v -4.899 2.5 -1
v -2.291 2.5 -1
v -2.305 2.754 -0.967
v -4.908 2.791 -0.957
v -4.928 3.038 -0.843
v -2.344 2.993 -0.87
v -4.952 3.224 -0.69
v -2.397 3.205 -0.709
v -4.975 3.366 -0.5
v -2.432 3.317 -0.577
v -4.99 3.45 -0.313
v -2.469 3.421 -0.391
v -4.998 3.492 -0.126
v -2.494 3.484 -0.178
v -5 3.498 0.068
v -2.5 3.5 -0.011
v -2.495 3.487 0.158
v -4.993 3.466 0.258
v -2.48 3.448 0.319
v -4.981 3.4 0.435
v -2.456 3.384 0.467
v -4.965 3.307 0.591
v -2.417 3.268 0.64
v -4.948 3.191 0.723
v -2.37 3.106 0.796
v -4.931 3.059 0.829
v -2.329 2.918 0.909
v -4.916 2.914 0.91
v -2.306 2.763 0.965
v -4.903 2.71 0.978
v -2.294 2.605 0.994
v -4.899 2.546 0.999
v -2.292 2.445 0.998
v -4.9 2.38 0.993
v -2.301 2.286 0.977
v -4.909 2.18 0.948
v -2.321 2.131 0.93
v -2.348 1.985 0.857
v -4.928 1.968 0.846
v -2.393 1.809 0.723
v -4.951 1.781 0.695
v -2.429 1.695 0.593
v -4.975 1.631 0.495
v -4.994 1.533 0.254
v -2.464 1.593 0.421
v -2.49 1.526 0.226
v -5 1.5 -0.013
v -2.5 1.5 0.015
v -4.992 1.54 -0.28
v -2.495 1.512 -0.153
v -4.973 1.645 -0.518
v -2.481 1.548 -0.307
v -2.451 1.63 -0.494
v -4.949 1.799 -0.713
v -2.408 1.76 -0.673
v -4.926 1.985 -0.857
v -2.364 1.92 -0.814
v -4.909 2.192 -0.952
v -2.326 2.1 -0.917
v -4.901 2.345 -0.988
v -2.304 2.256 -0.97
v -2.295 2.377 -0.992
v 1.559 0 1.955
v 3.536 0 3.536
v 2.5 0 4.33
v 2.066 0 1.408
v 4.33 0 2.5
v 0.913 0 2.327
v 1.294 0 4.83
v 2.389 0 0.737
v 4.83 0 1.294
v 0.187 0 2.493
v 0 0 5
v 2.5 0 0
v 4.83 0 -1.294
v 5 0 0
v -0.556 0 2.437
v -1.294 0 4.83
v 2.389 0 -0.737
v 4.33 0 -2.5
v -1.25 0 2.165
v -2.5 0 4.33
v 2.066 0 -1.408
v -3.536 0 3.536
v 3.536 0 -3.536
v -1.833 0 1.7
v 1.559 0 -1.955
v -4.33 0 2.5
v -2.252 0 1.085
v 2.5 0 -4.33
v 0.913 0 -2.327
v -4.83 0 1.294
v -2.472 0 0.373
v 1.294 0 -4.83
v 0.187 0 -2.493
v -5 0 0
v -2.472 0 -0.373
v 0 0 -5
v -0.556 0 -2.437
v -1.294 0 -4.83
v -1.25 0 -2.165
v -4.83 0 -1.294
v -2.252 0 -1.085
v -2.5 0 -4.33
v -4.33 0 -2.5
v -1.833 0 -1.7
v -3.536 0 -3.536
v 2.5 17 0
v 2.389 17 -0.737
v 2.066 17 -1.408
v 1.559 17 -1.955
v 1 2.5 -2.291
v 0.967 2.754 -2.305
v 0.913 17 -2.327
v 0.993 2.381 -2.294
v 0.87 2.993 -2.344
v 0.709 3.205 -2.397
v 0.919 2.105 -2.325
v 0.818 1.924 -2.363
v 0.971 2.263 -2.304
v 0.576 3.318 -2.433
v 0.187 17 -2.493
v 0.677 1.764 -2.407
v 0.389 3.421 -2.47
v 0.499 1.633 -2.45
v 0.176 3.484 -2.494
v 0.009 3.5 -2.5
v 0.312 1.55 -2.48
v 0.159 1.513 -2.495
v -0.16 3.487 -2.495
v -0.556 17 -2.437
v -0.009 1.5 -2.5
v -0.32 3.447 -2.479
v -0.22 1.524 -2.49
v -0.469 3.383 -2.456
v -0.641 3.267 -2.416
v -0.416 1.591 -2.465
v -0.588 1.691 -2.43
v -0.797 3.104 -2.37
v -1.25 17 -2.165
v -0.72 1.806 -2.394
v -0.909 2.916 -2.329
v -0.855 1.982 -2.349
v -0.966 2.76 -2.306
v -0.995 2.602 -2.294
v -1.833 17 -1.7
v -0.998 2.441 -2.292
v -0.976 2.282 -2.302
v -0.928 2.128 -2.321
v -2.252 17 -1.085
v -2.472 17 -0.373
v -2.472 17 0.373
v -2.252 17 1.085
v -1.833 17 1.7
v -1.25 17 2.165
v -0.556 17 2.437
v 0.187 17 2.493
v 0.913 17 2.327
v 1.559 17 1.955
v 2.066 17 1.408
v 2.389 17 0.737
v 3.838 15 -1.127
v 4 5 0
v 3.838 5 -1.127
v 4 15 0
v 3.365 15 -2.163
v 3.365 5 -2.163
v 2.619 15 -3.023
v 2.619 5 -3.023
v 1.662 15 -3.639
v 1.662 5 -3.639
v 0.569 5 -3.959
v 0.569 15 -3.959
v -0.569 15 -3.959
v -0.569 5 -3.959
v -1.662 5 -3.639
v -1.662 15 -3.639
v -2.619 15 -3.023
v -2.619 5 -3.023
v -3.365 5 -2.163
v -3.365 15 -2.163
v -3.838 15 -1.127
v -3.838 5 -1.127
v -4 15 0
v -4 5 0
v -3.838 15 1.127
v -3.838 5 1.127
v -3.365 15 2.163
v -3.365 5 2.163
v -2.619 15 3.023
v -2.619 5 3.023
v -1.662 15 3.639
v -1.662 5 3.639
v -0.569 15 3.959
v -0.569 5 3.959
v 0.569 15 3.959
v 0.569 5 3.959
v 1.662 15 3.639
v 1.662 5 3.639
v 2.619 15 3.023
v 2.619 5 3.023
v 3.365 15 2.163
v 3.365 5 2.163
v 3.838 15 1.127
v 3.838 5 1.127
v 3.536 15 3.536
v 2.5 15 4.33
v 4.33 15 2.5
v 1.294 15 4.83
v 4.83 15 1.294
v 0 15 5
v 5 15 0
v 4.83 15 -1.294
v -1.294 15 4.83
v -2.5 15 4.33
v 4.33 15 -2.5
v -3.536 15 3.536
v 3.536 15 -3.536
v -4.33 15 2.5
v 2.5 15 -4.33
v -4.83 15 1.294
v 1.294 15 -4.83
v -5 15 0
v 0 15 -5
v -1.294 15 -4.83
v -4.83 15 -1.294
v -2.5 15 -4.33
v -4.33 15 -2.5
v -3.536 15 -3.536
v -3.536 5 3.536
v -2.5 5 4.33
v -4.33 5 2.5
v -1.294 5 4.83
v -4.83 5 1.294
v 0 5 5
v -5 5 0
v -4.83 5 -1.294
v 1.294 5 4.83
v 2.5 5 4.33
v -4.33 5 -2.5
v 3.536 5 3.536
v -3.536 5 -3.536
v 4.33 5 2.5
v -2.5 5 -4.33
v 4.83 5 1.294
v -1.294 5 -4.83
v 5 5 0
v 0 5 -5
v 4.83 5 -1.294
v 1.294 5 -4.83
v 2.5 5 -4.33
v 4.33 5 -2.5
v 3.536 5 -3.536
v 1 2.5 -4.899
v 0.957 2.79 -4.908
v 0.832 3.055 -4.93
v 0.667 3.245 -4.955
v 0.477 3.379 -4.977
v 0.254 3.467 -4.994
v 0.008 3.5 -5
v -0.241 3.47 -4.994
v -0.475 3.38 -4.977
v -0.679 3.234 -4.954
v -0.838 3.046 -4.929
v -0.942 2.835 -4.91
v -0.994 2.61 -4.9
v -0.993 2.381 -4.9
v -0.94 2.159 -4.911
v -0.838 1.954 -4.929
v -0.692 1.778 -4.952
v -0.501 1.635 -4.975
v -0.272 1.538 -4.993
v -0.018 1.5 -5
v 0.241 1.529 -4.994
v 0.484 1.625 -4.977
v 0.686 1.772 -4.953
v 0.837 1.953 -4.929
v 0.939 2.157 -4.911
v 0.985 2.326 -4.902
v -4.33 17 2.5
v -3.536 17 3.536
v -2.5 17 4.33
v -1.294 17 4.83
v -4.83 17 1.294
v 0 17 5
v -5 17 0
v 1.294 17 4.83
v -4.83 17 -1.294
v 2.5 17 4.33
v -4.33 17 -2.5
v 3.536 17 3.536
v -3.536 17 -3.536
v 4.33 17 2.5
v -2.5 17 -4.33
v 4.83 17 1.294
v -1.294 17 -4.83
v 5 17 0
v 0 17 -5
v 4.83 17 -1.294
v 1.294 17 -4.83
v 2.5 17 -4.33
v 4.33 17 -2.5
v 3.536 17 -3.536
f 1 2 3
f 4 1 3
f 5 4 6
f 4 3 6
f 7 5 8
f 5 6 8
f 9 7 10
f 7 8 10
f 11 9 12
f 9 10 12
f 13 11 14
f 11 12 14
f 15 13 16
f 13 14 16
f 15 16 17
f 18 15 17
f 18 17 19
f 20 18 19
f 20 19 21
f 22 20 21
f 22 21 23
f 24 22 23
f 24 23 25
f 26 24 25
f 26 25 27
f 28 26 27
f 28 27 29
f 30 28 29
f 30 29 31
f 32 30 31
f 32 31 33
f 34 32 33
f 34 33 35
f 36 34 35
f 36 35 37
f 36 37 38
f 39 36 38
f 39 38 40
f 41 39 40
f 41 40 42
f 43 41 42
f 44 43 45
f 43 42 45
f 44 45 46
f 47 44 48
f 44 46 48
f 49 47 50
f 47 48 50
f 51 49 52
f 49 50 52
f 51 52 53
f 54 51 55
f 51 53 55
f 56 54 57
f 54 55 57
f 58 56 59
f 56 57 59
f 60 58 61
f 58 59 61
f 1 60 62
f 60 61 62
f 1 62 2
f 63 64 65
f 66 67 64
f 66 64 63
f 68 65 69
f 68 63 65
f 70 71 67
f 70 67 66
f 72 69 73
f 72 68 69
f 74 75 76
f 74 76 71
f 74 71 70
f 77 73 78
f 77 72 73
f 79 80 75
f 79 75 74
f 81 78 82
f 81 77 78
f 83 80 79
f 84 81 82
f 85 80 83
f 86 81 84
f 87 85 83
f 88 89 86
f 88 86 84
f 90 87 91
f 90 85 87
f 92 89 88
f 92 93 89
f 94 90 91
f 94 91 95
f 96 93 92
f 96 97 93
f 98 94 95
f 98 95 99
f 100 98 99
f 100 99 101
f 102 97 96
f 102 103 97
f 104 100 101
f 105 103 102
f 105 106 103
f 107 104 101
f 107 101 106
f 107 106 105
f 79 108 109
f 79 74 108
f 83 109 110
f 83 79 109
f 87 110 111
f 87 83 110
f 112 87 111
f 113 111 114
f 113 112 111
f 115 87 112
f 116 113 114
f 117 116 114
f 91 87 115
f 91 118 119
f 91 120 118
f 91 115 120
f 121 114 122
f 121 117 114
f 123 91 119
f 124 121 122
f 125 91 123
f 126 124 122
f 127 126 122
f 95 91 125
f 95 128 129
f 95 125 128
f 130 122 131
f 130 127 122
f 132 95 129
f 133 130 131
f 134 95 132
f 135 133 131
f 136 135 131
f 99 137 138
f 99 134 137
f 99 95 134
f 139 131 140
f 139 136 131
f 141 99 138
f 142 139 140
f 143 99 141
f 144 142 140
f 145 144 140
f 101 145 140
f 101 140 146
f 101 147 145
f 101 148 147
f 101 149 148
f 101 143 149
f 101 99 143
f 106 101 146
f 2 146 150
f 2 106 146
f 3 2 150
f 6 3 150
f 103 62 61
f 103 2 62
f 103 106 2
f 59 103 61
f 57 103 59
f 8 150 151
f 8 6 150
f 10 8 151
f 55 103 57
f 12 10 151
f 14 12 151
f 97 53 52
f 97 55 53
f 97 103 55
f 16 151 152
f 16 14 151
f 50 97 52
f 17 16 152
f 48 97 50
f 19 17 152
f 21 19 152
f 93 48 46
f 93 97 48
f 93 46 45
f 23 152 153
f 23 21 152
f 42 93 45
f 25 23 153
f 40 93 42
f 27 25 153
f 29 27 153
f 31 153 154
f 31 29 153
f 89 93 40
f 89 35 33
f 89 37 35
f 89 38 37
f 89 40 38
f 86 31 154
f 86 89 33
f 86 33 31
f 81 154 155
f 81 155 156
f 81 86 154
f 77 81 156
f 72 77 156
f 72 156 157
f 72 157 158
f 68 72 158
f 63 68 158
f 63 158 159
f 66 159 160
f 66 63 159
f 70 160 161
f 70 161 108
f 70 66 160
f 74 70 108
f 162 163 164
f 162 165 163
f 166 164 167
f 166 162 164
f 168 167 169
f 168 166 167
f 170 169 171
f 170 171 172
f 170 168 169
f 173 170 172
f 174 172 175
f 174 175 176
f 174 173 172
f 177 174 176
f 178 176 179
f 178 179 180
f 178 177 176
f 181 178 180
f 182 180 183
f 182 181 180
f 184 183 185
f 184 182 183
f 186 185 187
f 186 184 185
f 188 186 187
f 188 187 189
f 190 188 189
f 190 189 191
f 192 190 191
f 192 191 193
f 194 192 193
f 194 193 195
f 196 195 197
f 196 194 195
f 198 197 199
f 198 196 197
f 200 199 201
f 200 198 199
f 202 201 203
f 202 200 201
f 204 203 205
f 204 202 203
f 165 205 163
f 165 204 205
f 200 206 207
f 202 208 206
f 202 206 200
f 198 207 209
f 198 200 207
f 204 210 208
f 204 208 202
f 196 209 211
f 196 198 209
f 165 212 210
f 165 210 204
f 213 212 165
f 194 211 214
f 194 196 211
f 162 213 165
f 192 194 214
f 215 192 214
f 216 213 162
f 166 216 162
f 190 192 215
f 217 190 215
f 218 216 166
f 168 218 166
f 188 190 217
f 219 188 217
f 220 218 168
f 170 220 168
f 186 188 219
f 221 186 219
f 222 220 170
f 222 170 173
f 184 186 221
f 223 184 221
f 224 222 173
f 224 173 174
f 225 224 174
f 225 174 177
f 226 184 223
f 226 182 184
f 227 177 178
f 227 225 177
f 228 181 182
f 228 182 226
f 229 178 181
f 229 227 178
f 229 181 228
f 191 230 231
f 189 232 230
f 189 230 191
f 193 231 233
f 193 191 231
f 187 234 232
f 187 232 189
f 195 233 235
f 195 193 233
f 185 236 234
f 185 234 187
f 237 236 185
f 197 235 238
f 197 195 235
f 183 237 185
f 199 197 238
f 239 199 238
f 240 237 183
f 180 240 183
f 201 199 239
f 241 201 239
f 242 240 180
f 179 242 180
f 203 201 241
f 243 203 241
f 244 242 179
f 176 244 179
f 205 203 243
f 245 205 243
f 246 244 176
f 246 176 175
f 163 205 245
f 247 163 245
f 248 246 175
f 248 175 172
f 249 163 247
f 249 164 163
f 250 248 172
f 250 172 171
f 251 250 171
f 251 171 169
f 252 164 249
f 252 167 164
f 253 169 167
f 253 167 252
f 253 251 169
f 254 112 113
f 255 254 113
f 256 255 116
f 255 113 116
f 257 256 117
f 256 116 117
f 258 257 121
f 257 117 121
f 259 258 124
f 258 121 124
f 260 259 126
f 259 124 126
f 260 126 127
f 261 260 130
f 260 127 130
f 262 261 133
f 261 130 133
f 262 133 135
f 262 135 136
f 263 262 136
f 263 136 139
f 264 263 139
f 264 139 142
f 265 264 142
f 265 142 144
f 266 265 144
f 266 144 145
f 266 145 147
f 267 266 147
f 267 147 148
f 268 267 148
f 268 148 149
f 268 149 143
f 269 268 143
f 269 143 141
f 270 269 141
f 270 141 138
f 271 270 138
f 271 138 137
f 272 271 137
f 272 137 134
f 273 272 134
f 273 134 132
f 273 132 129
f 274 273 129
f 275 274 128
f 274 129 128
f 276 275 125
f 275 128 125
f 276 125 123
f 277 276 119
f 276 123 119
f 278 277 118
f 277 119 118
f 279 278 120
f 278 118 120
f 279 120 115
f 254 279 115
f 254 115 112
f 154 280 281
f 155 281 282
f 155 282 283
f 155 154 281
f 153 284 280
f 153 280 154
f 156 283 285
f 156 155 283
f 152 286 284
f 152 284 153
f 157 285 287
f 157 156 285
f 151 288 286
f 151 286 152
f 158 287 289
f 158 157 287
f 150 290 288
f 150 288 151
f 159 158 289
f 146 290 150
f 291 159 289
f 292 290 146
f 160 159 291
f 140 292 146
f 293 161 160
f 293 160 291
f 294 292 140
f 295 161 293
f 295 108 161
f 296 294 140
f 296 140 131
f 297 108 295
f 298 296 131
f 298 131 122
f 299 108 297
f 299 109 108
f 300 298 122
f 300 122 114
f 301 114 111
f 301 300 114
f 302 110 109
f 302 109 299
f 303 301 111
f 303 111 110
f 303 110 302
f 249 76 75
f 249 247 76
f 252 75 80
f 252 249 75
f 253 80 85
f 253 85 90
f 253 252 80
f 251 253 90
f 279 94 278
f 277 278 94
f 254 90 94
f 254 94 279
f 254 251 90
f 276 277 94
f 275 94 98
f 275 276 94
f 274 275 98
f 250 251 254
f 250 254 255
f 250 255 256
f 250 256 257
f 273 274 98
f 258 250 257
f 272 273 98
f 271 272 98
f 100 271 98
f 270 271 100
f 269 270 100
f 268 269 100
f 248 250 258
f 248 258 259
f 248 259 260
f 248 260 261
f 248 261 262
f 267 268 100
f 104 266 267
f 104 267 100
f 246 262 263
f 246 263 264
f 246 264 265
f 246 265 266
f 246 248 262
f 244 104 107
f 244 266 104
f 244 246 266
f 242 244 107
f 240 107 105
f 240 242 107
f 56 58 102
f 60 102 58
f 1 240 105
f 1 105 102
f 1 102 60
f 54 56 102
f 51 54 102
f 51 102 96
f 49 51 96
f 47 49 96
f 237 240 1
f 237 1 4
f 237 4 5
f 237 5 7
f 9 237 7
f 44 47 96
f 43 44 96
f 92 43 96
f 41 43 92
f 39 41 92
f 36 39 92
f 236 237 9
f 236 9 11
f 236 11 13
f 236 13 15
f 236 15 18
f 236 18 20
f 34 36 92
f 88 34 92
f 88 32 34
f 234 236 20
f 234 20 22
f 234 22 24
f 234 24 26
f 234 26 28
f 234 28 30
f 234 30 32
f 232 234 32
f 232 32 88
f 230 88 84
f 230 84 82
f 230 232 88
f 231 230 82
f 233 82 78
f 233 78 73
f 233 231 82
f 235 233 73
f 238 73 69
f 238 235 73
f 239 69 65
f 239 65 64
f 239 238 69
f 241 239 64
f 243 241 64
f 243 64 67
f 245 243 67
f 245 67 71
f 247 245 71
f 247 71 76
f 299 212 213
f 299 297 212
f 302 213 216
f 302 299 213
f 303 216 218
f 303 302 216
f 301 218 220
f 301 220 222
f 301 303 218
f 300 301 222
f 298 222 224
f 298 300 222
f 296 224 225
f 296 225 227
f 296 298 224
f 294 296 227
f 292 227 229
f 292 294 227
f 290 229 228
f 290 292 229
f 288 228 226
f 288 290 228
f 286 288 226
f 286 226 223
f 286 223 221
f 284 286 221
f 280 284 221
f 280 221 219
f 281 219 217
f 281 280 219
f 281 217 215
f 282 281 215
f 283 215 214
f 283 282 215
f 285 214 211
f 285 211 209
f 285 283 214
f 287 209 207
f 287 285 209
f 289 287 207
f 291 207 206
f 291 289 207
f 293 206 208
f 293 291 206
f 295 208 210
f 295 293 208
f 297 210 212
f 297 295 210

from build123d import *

# Parameters (mm, degrees)
SKETCH3_R          = 1
CUT_EXTRUDE1_DEPTH = 10
SKETCH4_R          = 1
CUT_EXTRUDE2_DEPTH = 10


with BuildPart() as part:
    # Sketch1 → Revolve1 (revolve)
    with BuildSketch(Plane.XY):
        Polygon((2.5, 0), (5, 0), (5, 5), (4, 5), (4, 15), (5, 15), (5, 17), (2.5, 17), align=None)
    revolve(axis=Axis((0, 0, 0), (0, 1, 0)))

    # Sketch3 → Cut-Extrude1 (cut)
    with BuildSketch(Plane.XY):
        with Locations((0, 2.5)):
            Circle(SKETCH3_R)
    extrude(amount=-CUT_EXTRUDE1_DEPTH, mode=Mode.SUBTRACT)

    # Sketch4 → Cut-Extrude2 (cut)
    with BuildSketch(Plane(origin=(0, 0, 0), x_dir=(0, 0, -1), z_dir=(1, 0, 0))):
        with Locations((0, 2.5)):
            Circle(SKETCH4_R)
    extrude(amount=-CUT_EXTRUDE2_DEPTH, mode=Mode.SUBTRACT)


solid = part.part
